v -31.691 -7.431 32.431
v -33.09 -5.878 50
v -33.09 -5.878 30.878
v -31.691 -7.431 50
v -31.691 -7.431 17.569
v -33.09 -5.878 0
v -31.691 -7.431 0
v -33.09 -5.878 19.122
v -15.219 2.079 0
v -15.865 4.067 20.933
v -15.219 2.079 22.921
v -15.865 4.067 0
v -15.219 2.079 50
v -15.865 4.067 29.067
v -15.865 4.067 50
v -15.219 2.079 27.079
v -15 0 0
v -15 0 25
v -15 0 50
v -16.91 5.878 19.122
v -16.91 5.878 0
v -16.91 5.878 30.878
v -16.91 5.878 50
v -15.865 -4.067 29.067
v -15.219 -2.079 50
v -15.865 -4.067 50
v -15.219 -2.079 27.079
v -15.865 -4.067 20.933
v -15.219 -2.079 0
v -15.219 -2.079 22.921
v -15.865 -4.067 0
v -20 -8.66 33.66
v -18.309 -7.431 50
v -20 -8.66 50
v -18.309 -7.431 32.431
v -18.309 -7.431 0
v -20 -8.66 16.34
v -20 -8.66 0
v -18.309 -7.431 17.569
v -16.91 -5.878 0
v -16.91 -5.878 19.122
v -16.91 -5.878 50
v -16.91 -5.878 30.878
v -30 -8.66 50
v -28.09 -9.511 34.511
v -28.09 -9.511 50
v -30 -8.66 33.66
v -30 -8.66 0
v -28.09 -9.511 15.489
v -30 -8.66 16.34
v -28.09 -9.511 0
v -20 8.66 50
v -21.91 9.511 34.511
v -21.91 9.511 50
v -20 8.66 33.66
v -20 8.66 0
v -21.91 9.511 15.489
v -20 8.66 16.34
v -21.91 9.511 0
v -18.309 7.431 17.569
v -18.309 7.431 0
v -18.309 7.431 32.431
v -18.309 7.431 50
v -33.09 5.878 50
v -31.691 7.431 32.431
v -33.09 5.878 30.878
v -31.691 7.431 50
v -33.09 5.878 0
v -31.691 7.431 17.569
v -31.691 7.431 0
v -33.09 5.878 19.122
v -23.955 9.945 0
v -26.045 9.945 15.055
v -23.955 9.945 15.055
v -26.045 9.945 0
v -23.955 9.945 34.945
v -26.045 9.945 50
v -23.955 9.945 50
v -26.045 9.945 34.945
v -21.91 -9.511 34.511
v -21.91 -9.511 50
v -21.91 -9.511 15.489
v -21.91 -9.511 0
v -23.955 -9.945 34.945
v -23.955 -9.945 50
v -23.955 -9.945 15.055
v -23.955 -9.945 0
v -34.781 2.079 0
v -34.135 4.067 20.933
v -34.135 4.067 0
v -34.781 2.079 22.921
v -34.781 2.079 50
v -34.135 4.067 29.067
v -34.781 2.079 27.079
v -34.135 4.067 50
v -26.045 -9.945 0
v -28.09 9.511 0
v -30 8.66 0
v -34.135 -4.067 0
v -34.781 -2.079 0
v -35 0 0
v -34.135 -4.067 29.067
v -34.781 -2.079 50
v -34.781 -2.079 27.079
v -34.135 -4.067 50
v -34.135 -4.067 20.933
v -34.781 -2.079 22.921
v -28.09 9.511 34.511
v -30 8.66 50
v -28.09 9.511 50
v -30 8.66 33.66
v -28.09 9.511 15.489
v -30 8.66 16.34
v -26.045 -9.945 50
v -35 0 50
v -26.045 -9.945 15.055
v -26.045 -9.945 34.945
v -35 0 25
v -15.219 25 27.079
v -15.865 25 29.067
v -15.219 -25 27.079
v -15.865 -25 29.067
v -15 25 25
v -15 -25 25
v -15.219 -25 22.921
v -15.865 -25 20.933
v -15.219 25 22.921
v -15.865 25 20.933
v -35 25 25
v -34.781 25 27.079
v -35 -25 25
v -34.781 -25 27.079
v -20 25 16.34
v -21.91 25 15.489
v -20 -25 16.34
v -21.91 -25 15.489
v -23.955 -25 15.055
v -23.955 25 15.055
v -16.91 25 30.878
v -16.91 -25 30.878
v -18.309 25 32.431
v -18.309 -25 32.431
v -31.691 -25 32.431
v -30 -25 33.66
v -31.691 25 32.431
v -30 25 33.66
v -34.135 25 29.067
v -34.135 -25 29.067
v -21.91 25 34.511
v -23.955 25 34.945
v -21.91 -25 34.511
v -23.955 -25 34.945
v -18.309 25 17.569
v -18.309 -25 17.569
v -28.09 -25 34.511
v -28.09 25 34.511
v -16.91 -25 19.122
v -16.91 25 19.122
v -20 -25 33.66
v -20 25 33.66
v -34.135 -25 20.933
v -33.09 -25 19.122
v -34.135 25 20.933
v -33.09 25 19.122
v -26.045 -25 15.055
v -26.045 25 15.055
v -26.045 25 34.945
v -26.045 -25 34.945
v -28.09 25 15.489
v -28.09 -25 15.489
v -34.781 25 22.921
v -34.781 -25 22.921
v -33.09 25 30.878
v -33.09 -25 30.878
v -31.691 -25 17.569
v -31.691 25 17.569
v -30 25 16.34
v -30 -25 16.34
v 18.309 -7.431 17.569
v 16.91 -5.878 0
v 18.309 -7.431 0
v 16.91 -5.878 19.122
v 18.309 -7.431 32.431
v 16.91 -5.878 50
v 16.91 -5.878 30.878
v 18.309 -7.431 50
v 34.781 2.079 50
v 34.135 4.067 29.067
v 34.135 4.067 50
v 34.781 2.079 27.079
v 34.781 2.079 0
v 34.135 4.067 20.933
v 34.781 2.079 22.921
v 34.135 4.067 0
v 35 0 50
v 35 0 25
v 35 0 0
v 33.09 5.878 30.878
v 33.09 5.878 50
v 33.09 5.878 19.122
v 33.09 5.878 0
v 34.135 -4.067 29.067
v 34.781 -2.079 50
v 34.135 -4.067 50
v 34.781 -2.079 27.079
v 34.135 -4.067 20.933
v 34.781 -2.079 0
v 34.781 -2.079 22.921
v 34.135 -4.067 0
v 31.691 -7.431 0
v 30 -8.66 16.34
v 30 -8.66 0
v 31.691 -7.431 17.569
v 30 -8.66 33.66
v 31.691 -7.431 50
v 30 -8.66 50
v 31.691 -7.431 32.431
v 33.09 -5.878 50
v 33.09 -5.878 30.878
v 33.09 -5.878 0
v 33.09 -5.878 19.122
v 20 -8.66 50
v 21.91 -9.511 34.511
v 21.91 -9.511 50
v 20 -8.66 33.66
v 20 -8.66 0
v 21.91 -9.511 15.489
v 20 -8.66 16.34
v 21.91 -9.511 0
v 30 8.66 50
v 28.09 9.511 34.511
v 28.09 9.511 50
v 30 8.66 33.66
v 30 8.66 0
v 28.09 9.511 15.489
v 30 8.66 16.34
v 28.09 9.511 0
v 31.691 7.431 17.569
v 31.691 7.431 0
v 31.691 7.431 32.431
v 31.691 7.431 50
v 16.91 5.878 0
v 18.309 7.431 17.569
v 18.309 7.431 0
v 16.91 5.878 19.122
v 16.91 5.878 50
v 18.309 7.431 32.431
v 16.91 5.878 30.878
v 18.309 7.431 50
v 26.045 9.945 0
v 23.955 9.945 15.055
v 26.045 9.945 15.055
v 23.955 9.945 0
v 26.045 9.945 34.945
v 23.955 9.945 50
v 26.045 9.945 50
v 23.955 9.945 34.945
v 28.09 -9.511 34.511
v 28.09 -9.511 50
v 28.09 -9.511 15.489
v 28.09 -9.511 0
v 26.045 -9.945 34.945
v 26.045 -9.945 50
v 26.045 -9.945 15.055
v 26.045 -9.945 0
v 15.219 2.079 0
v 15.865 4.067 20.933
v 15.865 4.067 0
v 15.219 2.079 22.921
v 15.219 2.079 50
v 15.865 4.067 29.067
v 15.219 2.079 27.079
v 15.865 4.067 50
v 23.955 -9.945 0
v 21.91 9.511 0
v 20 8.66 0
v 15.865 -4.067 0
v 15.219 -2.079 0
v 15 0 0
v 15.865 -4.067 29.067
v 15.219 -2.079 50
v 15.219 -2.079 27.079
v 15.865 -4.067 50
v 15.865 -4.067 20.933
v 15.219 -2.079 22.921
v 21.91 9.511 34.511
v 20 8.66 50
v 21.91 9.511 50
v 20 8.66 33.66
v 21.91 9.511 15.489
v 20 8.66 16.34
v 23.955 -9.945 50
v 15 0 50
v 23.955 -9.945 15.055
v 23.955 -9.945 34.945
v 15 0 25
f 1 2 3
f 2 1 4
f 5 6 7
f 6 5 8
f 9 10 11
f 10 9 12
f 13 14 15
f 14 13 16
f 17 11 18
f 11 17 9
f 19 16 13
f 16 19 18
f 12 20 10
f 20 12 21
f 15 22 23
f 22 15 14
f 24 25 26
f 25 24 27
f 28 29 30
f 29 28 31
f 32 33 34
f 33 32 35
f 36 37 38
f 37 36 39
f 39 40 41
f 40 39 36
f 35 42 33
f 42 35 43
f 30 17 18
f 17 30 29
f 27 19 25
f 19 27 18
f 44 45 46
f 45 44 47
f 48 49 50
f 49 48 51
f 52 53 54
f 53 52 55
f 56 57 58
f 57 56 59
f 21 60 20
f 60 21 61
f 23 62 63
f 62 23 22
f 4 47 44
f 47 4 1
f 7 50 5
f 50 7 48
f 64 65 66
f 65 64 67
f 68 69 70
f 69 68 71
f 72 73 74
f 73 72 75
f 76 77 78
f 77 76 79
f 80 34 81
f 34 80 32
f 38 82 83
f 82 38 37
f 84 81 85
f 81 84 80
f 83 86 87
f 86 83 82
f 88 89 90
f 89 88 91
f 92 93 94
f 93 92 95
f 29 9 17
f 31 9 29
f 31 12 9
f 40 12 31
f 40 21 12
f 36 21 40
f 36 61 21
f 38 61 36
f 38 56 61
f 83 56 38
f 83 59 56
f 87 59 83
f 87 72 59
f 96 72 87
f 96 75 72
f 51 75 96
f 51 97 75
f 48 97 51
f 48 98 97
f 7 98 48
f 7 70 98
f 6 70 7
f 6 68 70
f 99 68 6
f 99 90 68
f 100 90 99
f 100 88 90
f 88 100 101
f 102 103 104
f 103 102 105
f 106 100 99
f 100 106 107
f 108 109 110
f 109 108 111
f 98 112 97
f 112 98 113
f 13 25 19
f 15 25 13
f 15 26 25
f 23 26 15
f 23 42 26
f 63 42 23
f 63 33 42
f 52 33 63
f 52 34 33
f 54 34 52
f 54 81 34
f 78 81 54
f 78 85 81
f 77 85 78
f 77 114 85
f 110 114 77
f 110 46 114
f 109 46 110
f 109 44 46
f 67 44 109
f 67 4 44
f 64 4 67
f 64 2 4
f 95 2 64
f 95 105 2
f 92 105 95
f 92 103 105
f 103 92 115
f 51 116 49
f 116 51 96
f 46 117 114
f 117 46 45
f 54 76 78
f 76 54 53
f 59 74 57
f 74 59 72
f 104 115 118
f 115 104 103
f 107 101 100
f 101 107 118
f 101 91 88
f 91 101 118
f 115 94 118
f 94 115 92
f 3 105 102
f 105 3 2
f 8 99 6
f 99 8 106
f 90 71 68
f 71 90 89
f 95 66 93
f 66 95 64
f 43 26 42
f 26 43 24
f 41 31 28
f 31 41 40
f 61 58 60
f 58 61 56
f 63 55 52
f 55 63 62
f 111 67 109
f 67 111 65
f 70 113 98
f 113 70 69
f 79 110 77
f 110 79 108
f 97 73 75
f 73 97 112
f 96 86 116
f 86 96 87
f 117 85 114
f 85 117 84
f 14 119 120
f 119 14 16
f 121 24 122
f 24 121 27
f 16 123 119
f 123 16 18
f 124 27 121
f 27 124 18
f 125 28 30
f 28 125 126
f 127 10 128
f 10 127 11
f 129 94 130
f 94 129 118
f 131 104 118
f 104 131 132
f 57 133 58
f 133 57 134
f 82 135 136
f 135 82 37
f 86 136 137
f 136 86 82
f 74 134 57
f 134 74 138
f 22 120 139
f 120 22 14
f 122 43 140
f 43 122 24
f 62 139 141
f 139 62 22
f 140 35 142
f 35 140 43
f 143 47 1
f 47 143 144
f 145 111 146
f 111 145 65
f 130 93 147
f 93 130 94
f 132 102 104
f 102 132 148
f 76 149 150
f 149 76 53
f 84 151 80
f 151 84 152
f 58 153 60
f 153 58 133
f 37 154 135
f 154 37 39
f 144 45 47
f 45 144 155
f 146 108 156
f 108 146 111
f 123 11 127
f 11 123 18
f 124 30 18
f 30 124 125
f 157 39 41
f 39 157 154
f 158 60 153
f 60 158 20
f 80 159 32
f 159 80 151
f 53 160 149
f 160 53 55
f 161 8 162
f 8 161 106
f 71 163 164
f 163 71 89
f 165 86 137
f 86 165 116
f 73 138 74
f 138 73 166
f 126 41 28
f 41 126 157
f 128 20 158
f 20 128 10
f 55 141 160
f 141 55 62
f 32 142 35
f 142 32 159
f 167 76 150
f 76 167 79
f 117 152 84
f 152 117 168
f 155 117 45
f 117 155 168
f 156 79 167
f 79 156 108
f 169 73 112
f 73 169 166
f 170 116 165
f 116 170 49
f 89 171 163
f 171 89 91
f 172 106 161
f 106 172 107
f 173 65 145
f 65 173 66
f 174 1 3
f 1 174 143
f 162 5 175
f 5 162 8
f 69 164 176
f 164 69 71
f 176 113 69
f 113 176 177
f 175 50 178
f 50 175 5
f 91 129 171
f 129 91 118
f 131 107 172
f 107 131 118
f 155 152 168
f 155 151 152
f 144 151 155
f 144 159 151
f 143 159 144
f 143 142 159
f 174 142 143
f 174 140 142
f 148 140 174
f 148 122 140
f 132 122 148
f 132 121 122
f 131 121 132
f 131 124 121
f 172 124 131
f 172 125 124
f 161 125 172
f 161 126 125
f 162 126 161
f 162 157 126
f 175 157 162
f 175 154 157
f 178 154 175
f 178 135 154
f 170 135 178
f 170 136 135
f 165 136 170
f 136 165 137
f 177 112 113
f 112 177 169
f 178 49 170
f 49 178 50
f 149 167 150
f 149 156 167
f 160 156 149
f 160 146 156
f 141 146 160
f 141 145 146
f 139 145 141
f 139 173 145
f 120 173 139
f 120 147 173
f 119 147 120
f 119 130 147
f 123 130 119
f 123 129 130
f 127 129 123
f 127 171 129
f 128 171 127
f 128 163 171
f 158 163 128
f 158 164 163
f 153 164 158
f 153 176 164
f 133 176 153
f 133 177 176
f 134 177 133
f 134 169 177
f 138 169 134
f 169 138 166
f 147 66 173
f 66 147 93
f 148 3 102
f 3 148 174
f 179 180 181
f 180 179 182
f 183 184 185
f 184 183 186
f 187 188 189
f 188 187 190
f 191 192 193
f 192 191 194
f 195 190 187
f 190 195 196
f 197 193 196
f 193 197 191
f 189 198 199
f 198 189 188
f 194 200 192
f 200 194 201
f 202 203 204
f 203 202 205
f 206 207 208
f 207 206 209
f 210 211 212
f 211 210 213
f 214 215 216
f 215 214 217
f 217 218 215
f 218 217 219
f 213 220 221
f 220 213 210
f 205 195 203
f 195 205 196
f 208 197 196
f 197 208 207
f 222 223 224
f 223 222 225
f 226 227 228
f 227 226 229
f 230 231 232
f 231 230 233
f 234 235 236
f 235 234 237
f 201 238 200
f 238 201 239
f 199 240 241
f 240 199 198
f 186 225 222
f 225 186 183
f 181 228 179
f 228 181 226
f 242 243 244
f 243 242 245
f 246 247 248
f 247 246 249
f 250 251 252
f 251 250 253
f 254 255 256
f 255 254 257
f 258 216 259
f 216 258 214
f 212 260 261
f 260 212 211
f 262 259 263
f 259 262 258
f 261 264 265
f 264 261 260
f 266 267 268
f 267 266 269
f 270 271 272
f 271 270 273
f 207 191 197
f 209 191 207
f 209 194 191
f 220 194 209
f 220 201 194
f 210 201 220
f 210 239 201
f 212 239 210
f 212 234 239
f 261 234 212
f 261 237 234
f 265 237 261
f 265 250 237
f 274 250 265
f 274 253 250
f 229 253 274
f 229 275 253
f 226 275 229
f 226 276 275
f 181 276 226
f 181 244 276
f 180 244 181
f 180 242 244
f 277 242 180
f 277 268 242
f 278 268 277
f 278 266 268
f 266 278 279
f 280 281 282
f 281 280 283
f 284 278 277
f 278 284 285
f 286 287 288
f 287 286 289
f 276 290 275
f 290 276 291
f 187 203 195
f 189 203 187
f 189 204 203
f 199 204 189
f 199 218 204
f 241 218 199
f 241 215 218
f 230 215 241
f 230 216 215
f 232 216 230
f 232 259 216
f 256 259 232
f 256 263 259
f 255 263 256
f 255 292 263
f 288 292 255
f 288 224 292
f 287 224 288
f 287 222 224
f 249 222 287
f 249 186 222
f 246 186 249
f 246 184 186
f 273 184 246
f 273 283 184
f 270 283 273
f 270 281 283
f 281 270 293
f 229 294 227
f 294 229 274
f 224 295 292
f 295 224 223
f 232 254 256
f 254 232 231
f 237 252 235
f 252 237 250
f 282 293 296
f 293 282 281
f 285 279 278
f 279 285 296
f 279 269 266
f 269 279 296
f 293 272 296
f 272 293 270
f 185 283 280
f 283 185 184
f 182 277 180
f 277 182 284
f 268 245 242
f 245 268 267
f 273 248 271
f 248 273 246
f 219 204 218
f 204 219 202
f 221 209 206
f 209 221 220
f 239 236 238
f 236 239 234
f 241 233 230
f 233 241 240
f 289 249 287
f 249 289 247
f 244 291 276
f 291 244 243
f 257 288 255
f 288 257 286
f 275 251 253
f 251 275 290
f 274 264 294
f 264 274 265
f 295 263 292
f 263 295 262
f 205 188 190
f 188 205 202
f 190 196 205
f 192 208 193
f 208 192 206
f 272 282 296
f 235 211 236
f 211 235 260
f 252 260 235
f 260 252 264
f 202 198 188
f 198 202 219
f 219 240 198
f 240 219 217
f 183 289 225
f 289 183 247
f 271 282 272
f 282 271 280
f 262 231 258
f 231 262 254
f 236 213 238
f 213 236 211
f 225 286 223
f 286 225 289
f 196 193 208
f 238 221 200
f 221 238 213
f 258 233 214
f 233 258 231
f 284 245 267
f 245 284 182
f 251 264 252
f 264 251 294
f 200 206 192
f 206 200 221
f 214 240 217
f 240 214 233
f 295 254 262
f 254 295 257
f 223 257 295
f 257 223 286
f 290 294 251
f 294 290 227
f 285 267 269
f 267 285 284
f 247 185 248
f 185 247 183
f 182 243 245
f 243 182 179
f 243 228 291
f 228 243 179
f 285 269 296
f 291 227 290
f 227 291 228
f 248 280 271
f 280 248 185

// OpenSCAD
translate([-25,0,0])
{
cylinder(h=50,r=10);
translate([0,25,25]) rotate([90,0,0]) cylinder(h=50,r=10);
}

translate([25,0,0]) difference()
{
cylinder(h=50,r=10);
translate([0,25,25]) rotate([90,0,0]) cylinder(h=50,r=10);
}
